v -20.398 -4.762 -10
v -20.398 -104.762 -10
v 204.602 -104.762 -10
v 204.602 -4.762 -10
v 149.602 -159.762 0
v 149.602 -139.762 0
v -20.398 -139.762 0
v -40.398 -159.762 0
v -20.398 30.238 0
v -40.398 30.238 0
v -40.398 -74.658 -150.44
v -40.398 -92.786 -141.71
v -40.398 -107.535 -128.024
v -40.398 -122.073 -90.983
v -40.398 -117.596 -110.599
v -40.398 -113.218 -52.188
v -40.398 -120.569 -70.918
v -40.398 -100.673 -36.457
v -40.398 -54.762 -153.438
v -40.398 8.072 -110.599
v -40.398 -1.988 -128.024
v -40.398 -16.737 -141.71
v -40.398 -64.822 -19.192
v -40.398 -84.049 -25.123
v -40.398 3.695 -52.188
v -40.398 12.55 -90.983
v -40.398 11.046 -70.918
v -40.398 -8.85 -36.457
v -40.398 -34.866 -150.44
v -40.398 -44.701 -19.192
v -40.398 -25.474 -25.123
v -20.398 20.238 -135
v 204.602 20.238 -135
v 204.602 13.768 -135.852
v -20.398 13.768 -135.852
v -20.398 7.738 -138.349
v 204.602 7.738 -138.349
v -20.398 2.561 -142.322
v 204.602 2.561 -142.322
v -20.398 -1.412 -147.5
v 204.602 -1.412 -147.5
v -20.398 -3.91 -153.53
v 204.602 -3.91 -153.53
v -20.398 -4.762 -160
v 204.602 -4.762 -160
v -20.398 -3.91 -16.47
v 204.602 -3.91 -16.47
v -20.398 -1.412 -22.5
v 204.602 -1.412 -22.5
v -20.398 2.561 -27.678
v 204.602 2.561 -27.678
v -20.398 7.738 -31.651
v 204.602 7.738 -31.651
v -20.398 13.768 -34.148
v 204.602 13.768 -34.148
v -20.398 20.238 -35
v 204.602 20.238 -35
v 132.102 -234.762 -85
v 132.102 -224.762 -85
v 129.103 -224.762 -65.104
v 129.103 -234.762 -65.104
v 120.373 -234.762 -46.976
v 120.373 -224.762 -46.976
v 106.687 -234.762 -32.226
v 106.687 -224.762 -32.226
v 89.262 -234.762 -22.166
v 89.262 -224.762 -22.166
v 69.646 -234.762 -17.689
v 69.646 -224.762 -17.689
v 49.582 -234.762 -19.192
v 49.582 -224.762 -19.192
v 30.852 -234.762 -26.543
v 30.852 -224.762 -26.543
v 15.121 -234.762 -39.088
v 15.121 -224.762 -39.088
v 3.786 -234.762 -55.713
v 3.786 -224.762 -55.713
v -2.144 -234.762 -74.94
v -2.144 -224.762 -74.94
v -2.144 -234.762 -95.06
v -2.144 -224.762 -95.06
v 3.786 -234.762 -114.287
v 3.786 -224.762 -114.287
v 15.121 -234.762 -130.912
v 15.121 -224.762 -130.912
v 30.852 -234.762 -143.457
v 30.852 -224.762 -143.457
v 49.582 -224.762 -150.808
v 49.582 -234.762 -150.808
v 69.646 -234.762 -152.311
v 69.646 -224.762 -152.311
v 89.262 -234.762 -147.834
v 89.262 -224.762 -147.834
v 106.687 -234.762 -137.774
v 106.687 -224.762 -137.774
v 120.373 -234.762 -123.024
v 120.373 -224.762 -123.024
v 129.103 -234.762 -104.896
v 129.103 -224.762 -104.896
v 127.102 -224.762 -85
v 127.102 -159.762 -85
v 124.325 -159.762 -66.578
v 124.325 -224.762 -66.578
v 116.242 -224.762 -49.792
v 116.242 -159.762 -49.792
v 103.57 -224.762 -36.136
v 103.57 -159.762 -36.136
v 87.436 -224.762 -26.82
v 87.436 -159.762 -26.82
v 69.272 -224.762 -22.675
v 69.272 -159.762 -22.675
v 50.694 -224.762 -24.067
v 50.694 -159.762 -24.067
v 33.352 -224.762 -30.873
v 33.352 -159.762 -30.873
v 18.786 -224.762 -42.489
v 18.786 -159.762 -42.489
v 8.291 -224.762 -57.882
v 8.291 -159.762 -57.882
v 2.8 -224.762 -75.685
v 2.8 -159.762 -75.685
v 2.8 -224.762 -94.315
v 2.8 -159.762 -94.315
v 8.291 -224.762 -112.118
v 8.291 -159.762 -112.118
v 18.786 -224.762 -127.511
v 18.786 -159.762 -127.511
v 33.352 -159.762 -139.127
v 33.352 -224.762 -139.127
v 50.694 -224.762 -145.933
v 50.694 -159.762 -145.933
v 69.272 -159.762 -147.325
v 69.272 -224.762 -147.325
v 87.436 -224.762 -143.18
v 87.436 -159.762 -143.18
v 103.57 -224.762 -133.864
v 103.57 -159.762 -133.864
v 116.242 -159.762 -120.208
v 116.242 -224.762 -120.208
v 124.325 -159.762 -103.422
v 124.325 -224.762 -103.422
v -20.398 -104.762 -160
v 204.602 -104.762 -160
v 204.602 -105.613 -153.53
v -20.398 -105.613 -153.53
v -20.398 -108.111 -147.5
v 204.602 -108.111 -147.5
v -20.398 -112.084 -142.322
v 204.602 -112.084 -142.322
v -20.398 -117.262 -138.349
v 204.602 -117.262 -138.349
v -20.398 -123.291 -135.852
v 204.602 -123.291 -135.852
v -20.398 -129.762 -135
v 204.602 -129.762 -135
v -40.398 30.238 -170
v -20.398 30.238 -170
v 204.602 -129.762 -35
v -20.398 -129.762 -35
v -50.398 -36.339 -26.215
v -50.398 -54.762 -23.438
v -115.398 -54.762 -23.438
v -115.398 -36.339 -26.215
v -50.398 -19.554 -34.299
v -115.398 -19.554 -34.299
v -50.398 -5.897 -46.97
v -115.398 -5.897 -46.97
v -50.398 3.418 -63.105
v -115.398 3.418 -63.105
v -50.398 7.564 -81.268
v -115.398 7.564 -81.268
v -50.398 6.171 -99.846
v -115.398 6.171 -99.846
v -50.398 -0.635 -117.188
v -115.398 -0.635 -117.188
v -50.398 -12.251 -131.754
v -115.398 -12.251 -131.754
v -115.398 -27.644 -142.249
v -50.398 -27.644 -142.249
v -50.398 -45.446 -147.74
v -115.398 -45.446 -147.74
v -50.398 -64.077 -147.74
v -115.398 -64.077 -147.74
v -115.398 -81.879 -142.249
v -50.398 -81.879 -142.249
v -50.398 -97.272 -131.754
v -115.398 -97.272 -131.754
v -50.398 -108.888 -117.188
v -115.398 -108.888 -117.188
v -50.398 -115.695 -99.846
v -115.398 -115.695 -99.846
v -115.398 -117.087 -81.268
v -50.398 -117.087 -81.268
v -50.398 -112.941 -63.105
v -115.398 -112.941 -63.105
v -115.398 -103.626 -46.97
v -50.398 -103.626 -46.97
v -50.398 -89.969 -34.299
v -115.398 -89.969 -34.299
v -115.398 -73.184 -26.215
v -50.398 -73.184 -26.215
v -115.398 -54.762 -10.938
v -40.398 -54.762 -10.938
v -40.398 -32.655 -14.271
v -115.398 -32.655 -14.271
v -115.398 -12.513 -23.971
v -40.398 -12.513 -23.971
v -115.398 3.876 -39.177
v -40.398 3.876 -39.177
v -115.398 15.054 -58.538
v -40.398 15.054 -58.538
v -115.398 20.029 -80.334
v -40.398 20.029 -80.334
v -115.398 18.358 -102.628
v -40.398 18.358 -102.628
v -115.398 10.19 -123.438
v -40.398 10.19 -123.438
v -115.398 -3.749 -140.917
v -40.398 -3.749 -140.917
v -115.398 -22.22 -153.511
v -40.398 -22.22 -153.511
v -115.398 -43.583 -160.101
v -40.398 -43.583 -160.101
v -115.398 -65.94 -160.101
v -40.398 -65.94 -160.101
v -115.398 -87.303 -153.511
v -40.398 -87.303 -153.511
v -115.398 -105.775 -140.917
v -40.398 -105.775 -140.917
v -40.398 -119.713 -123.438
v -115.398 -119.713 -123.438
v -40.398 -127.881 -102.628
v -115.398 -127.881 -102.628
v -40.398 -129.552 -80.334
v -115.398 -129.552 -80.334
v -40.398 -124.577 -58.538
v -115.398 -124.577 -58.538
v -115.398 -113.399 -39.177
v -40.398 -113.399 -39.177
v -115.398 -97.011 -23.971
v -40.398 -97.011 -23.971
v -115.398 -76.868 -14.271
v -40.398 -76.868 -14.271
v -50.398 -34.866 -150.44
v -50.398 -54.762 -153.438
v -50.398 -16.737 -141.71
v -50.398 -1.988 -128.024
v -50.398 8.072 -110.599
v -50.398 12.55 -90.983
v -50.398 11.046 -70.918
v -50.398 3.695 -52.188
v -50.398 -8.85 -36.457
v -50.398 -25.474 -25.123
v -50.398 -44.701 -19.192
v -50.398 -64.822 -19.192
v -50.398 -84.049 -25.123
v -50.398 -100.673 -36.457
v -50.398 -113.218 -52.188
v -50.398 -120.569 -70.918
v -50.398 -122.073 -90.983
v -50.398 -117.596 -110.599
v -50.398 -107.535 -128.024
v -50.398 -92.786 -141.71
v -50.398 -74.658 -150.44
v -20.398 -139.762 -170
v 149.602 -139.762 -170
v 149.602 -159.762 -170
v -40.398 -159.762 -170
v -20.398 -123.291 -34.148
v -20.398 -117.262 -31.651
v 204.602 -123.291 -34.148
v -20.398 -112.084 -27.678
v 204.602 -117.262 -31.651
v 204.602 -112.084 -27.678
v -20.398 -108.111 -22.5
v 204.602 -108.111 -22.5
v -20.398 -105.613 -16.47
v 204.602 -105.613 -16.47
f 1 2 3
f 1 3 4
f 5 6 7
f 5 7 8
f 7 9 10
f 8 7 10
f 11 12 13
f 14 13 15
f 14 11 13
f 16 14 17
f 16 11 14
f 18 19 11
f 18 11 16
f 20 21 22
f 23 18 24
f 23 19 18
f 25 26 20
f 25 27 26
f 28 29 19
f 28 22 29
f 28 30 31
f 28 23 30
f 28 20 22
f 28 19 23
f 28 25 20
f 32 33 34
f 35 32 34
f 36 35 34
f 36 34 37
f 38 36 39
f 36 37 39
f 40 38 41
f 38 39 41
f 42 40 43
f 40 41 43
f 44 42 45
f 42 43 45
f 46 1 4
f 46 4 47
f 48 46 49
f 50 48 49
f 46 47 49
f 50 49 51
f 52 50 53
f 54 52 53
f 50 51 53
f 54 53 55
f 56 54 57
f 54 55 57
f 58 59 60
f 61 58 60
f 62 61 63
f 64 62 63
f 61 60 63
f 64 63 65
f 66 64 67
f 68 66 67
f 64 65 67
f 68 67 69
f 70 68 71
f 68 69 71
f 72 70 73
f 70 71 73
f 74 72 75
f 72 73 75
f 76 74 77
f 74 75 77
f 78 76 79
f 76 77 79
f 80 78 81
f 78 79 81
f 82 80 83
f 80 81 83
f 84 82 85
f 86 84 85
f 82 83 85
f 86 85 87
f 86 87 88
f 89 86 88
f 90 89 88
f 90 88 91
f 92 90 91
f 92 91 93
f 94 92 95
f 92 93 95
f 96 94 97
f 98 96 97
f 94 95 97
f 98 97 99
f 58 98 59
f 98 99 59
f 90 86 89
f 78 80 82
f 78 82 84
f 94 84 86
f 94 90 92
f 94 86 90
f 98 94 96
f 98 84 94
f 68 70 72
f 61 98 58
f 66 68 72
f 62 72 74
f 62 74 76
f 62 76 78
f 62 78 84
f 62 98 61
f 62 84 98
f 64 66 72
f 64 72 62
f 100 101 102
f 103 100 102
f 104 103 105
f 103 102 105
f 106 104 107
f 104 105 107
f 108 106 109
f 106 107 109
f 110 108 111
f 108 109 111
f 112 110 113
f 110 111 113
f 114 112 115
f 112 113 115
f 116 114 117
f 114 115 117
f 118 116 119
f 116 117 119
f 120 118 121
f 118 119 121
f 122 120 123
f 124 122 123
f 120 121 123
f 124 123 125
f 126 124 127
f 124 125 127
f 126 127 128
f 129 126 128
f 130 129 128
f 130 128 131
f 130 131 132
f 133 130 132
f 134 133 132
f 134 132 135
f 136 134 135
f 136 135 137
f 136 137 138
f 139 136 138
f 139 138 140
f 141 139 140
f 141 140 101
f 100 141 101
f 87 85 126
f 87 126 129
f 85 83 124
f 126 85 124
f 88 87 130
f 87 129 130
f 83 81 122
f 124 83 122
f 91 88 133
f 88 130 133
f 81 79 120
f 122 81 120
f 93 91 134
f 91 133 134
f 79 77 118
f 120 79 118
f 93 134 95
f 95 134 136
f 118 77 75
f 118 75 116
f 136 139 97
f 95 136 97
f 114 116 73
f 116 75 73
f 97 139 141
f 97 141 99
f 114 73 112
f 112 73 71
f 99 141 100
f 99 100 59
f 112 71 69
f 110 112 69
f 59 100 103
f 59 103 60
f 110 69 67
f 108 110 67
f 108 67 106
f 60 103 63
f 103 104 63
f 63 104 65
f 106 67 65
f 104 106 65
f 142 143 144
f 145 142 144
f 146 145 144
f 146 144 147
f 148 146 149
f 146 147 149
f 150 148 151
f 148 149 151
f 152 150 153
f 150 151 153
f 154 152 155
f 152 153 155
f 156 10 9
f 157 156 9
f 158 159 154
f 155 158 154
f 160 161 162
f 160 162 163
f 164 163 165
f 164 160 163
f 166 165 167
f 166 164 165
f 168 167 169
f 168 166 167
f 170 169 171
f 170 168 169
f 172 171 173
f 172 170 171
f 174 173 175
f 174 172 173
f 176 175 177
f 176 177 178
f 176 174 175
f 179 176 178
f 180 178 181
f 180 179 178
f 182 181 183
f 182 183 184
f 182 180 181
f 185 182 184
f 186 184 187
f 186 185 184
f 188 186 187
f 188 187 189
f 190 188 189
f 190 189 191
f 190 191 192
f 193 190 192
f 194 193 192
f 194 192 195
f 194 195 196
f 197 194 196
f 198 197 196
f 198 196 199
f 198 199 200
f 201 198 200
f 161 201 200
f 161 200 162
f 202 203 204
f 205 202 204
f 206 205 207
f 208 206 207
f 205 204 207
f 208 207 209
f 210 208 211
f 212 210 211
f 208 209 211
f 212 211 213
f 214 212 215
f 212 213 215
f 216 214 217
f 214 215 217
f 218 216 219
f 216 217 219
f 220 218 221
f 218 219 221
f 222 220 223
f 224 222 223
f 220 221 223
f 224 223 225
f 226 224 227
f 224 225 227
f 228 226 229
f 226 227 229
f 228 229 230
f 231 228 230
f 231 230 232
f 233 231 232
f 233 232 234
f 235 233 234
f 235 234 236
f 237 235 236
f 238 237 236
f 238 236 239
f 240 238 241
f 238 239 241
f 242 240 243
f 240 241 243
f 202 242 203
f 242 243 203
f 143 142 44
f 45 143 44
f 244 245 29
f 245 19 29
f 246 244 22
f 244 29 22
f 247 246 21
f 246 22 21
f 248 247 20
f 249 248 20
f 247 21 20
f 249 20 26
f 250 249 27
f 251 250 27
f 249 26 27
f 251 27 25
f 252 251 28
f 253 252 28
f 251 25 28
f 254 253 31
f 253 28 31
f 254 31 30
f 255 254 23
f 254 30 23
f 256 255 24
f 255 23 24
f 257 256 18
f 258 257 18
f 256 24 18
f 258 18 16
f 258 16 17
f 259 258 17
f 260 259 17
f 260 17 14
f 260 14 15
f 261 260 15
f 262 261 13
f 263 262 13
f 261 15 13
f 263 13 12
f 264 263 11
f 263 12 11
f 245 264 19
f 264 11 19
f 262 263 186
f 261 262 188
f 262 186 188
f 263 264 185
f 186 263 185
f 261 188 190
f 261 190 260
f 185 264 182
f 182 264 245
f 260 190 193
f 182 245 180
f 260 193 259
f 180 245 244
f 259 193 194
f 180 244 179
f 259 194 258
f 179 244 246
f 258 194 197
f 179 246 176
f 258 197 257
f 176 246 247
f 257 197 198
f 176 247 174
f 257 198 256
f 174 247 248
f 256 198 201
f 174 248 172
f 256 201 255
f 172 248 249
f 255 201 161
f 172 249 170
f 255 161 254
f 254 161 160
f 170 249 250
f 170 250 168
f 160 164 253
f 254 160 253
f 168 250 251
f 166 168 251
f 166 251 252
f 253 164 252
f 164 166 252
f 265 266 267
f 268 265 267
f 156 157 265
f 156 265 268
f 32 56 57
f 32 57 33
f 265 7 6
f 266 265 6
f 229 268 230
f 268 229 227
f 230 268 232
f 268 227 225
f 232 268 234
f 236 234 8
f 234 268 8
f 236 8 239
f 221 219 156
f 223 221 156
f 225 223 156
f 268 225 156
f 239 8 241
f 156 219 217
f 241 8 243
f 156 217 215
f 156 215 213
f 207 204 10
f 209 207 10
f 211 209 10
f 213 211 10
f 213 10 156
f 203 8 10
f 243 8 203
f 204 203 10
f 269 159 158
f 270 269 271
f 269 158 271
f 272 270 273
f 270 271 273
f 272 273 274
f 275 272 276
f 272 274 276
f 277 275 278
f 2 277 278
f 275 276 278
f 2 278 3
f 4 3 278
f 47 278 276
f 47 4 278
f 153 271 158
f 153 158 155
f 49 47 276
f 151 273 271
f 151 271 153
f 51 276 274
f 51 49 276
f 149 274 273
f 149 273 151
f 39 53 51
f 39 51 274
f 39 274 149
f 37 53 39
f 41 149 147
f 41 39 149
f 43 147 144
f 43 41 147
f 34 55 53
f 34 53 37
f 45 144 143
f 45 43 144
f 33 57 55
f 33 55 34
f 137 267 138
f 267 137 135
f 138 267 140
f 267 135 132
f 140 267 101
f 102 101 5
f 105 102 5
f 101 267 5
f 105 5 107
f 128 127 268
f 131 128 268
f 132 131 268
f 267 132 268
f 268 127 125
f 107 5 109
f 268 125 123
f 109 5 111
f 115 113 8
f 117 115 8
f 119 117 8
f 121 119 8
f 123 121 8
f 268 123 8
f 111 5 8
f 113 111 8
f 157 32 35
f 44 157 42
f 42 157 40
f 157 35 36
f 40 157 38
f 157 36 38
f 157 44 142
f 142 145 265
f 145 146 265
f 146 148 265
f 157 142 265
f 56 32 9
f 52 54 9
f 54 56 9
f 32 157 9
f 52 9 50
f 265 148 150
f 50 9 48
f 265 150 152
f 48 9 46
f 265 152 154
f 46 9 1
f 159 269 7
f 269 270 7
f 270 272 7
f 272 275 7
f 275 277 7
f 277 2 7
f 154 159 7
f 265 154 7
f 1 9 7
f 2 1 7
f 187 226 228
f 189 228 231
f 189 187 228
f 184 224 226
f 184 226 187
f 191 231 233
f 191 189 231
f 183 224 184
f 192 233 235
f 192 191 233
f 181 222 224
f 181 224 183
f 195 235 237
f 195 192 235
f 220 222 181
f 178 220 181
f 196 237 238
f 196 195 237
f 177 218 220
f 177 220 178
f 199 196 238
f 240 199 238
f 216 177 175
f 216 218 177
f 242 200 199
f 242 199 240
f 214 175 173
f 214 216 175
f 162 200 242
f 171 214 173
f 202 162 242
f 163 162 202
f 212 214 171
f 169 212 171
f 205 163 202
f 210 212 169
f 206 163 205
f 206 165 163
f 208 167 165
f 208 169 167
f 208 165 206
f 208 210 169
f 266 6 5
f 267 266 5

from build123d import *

# Parameters (mm, degrees)
BOSS_EXTRUDE1_DEPTH = 170
SKETCH3_R           = 75
SKETCH3_R_2         = 62.5
BOSS_EXTRUDE2_DEPTH = 75
SKETCH4_W           = 150
SKETCH4_H           = 150
BOSS_EXTRUDE3_DEPTH = 225
CUT_EXTRUDE6_DEPTH  = 225
SKETCH6_R           = 62.5
BOSS_EXTRUDE4_DEPTH = 75
BOSS_EXTRUDE5_START = -10
SKETCH7_R           = 67.5
SKETCH7_R_2         = 62.5
BOSS_EXTRUDE5_DEPTH = 10
SKETCH8_W           = 10
SKETCH8_H           = 12.412745851


with BuildPart() as part:
    # Sketch2 → Boss-Extrude1 (new body)
    with BuildSketch(Plane.XY):
        Polygon((-40.398264296, 30.238450413), (-20.398264296, 30.238450413), (-20.398264296, -139.761549587), (149.601735704, -139.761549587), (149.601735704, -159.761549587), (-40.398264296, -159.761549587), align=None)
    extrude(amount=-BOSS_EXTRUDE1_DEPTH)

    # Sketch3 → Boss-Extrude2 (add)
    with BuildSketch(Plane.ZY.offset(40.398264296)):
        with Locations((-85.93846623, -54.761549587)):
            Circle(SKETCH3_R)
        with Locations((-85.93846623, -54.761549587)):
            Circle(SKETCH3_R_2, mode=Mode.SUBTRACT)
    extrude(amount=BOSS_EXTRUDE2_DEPTH)

    # Sketch4 → Boss-Extrude3 (add)
    with BuildSketch(Plane(origin=(-20.398264296, 0, 0), x_dir=(0, 0, -1), z_dir=(1, 0, 0))):
        with Locations((85, -54.761549587)):
            Rectangle(SKETCH4_W, SKETCH4_H)
    extrude(amount=BOSS_EXTRUDE3_DEPTH)

    # Sketch5 → Cut-Extrude6 (cut)
    with BuildSketch(Plane(origin=(204.601735704, 0, 0), x_dir=(0, 0, -1), z_dir=(1, 0, 0))):
        with BuildLine():
            Line((35, 20.238450413), (10, 20.238450413))
            Line((10, 20.238450413), (10, -4.761549587))
            ThreePointArc((10, -4.761549587), (27.67766953, 2.560780883), (35, 20.238450413))
        make_face()
        with BuildLine():
            ThreePointArc((35, -129.761549587), (27.67766953, -112.083880057), (10, -104.761549587))
            Line((10, -104.761549587), (10, -129.761549587))
            Line((10, -129.761549587), (35, -129.761549587))
        make_face()
        with BuildLine():
            ThreePointArc((160, -104.761549587), (142.32233047, -112.083880057), (135, -129.761549587))
            Line((135, -129.761549587), (160, -129.761549587))
            Line((160, -129.761549587), (160, -104.761549587))
        make_face()
        with BuildLine():
            Line((160, 20.238450413), (135, 20.238450413))
            ThreePointArc((135, 20.238450413), (142.32233047, 2.560780883), (160, -4.761549587))
            Line((160, -4.761549587), (160, 20.238450413))
        make_face()
    extrude(amount=-CUT_EXTRUDE6_DEPTH, mode=Mode.SUBTRACT)

    # Sketch6 → Boss-Extrude4 (add)
    with BuildSketch(Plane.XZ.offset(159.761549587)):
        with Locations((64.601735704, -85)):
            Circle(SKETCH6_R)
    extrude(amount=BOSS_EXTRUDE4_DEPTH)

    # Sketch7 → Boss-Extrude5 (add)
    with BuildSketch(Plane.XZ.offset(234.761549587).offset(BOSS_EXTRUDE5_START)):
        with Locations((64.601735704, -85)):
            Circle(SKETCH7_R)
        with Locations((64.601735704, -85)):
            Circle(SKETCH7_R_2, mode=Mode.SUBTRACT)
    extrude(amount=BOSS_EXTRUDE5_DEPTH)

    # Sketch8 → Cut-Revolve1 (revolve, cut)
    with BuildSketch(Plane.XZ.offset(54.761549587), mode=Mode.PRIVATE) as cut_revolve1_sk:
        with Locations((-45.398264296, -24.644839156)):
            Rectangle(SKETCH8_W, SKETCH8_H)
    revolve(cut_revolve1_sk.sketch.rotate(Axis((-115.398264296, -54.761549587, -85.93846623), (1, 0, 0)), 180), axis=Axis((-115.398264296, -54.761549587, -85.93846623), (1, 0, 0)), mode=Mode.SUBTRACT)


solid = part.part
